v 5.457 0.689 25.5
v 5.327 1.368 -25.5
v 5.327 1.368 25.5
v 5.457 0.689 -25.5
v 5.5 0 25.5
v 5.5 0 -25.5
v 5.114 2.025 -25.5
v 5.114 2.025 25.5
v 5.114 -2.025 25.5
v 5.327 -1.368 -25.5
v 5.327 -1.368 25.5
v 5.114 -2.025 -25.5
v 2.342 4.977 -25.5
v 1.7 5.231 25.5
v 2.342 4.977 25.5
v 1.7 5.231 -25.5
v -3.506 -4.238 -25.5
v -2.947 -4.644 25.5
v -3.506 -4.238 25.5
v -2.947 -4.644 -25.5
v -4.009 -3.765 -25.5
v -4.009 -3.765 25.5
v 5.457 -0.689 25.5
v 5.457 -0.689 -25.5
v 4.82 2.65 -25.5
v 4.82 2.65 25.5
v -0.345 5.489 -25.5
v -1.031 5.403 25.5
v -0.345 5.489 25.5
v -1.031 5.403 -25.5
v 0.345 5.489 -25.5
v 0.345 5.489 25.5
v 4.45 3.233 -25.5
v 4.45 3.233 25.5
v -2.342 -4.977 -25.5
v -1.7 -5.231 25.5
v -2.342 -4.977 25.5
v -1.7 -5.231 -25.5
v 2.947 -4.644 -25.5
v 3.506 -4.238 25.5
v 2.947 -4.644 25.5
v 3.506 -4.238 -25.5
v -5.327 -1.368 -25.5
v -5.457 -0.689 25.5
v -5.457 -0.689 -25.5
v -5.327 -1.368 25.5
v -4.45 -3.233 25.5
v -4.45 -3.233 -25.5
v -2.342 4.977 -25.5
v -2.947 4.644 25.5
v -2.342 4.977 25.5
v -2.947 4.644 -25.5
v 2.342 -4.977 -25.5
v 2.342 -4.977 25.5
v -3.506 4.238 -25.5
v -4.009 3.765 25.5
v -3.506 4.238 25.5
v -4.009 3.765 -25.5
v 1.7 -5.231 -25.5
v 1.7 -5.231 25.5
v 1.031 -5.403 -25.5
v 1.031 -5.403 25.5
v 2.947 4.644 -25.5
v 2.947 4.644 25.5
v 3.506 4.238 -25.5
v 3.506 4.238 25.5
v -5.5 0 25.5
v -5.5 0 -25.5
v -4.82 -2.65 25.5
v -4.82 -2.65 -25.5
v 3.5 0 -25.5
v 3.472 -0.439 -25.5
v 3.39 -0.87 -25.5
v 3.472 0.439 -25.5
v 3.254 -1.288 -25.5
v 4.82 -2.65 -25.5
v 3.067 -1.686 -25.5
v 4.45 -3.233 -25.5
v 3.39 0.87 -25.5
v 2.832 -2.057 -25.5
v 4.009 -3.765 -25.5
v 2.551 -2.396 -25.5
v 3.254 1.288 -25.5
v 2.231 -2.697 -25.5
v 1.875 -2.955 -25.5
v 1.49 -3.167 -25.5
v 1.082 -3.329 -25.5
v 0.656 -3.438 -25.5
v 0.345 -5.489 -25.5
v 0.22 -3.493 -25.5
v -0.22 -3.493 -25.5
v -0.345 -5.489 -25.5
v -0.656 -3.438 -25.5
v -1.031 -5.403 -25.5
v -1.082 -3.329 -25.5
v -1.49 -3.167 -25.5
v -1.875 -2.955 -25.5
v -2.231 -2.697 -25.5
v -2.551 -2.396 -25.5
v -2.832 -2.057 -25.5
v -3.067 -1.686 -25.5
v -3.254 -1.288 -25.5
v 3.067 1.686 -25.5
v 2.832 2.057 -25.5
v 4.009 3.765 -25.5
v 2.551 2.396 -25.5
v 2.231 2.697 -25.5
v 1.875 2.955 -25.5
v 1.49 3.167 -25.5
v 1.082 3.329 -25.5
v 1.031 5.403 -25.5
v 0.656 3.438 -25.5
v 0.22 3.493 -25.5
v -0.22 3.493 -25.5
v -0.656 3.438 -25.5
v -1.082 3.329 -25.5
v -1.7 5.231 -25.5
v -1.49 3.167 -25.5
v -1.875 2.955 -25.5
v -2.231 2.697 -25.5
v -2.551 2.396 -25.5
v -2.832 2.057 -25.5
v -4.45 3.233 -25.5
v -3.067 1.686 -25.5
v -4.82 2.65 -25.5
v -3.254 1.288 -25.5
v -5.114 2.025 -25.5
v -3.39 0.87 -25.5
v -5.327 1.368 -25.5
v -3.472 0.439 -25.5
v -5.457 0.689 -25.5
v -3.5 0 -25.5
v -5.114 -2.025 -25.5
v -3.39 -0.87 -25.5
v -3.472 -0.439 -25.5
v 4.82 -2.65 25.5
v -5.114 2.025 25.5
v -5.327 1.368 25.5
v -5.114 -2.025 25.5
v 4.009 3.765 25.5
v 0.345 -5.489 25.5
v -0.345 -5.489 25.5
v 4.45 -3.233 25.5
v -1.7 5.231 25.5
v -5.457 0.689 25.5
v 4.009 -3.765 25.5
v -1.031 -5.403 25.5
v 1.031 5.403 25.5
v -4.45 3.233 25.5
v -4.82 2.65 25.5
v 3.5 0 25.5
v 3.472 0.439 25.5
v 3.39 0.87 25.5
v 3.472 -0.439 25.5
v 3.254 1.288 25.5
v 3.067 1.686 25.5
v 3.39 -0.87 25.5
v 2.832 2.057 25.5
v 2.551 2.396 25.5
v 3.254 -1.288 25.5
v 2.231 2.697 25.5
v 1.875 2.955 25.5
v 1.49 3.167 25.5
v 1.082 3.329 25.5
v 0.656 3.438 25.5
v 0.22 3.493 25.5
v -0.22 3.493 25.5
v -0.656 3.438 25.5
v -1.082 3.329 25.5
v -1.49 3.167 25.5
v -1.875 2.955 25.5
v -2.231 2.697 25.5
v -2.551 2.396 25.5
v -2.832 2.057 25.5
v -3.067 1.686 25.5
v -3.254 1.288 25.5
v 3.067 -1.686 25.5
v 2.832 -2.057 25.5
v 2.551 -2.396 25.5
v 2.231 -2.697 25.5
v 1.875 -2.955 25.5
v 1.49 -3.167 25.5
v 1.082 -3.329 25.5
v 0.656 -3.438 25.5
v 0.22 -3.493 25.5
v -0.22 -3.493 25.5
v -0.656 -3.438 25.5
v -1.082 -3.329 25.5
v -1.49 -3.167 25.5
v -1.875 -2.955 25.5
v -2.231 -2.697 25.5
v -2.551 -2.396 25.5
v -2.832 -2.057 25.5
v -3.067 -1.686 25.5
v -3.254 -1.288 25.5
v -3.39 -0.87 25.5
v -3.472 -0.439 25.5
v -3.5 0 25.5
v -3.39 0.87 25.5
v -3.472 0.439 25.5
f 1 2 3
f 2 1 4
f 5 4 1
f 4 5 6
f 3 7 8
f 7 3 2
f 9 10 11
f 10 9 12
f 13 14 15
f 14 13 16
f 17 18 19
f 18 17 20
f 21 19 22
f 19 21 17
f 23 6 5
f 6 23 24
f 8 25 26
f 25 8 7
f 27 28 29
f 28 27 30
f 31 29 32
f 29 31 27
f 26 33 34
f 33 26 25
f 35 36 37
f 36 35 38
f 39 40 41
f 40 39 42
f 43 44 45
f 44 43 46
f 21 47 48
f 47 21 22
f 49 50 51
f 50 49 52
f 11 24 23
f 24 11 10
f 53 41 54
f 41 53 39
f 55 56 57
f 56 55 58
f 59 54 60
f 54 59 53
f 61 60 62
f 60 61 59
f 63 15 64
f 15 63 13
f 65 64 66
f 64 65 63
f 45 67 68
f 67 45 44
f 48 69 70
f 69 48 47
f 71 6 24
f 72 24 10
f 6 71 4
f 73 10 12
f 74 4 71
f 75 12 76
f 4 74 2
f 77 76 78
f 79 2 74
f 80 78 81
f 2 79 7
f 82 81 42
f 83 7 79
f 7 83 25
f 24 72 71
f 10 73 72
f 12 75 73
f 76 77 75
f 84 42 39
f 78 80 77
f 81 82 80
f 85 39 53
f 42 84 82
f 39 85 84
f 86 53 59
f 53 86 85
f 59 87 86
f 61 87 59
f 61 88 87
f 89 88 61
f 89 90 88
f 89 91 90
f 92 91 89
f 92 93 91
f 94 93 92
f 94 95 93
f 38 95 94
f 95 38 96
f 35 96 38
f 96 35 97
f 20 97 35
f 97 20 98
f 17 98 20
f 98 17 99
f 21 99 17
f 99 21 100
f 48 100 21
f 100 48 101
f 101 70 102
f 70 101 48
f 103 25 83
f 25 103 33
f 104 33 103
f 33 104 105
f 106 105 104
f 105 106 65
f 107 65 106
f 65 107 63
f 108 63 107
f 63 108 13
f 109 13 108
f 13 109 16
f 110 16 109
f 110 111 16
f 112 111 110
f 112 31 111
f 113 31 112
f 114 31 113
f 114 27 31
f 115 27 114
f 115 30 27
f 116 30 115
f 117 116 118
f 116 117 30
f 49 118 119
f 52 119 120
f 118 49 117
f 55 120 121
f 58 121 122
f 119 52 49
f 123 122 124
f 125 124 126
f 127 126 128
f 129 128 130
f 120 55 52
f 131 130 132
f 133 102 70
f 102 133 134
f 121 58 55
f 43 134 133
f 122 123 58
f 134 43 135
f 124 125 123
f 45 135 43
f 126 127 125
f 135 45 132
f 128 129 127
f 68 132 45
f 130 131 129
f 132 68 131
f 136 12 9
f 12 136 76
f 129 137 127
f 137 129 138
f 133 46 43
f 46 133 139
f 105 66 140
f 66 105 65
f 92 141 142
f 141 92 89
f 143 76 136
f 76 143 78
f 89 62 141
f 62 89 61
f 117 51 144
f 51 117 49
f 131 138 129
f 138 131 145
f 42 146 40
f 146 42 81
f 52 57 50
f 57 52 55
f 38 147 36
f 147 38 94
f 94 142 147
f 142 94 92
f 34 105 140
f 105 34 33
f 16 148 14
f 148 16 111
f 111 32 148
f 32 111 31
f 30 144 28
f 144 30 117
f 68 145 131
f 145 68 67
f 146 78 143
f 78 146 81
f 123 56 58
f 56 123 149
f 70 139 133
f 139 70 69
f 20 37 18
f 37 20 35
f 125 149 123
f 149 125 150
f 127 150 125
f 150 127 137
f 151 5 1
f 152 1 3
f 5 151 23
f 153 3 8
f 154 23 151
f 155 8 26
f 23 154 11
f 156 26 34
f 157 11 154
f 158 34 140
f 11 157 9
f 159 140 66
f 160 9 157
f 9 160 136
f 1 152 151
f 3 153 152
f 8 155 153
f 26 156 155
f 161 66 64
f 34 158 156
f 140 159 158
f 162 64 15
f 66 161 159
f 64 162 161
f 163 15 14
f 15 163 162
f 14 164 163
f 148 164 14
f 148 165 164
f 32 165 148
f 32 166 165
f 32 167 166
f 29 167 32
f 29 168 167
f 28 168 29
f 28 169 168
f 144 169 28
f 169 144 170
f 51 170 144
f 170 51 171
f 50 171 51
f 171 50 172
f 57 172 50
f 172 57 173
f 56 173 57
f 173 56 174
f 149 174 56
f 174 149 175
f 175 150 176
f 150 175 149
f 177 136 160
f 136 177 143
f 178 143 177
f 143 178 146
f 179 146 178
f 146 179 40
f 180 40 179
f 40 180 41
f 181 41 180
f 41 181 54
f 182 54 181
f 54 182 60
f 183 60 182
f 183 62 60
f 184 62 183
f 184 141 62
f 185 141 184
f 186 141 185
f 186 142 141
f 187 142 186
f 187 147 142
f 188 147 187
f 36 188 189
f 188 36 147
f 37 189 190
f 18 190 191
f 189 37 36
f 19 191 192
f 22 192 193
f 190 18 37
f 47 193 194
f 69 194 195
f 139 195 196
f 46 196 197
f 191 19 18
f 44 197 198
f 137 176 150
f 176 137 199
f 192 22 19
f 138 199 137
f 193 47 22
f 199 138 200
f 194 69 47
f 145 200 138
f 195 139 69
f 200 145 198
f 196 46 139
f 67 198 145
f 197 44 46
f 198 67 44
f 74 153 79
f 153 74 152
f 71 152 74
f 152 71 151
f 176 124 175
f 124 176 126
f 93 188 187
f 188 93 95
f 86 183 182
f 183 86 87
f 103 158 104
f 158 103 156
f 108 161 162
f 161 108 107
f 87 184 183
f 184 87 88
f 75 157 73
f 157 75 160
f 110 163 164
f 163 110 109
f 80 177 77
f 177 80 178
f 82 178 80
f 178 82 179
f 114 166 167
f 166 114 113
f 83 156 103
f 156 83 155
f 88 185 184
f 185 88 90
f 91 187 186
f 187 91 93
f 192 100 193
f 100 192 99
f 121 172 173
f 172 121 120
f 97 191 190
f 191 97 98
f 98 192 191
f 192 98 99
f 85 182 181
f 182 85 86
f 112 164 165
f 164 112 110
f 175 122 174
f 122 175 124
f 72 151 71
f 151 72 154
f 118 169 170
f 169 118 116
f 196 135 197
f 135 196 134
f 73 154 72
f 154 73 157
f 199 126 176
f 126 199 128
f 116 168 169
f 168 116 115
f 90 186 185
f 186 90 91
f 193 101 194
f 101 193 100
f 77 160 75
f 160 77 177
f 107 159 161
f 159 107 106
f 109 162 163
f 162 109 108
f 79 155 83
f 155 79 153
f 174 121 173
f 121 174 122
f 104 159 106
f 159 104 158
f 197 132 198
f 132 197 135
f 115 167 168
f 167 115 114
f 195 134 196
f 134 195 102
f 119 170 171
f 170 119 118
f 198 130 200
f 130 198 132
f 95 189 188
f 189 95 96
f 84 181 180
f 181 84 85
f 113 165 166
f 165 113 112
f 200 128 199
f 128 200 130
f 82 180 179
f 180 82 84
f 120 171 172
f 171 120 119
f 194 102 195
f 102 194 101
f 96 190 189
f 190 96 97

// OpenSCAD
$fn = 50;


difference() {
	union() {
		translate(v = [0, 0, -25.5000000000]) {
			cylinder(h = 51, r = 5.5000000000);
		}
	}
	union() {
		translate(v = [0, 0, -100.0000000000]) {
			cylinder(h = 200, r = 3.5000000000);
		}
	}
}
